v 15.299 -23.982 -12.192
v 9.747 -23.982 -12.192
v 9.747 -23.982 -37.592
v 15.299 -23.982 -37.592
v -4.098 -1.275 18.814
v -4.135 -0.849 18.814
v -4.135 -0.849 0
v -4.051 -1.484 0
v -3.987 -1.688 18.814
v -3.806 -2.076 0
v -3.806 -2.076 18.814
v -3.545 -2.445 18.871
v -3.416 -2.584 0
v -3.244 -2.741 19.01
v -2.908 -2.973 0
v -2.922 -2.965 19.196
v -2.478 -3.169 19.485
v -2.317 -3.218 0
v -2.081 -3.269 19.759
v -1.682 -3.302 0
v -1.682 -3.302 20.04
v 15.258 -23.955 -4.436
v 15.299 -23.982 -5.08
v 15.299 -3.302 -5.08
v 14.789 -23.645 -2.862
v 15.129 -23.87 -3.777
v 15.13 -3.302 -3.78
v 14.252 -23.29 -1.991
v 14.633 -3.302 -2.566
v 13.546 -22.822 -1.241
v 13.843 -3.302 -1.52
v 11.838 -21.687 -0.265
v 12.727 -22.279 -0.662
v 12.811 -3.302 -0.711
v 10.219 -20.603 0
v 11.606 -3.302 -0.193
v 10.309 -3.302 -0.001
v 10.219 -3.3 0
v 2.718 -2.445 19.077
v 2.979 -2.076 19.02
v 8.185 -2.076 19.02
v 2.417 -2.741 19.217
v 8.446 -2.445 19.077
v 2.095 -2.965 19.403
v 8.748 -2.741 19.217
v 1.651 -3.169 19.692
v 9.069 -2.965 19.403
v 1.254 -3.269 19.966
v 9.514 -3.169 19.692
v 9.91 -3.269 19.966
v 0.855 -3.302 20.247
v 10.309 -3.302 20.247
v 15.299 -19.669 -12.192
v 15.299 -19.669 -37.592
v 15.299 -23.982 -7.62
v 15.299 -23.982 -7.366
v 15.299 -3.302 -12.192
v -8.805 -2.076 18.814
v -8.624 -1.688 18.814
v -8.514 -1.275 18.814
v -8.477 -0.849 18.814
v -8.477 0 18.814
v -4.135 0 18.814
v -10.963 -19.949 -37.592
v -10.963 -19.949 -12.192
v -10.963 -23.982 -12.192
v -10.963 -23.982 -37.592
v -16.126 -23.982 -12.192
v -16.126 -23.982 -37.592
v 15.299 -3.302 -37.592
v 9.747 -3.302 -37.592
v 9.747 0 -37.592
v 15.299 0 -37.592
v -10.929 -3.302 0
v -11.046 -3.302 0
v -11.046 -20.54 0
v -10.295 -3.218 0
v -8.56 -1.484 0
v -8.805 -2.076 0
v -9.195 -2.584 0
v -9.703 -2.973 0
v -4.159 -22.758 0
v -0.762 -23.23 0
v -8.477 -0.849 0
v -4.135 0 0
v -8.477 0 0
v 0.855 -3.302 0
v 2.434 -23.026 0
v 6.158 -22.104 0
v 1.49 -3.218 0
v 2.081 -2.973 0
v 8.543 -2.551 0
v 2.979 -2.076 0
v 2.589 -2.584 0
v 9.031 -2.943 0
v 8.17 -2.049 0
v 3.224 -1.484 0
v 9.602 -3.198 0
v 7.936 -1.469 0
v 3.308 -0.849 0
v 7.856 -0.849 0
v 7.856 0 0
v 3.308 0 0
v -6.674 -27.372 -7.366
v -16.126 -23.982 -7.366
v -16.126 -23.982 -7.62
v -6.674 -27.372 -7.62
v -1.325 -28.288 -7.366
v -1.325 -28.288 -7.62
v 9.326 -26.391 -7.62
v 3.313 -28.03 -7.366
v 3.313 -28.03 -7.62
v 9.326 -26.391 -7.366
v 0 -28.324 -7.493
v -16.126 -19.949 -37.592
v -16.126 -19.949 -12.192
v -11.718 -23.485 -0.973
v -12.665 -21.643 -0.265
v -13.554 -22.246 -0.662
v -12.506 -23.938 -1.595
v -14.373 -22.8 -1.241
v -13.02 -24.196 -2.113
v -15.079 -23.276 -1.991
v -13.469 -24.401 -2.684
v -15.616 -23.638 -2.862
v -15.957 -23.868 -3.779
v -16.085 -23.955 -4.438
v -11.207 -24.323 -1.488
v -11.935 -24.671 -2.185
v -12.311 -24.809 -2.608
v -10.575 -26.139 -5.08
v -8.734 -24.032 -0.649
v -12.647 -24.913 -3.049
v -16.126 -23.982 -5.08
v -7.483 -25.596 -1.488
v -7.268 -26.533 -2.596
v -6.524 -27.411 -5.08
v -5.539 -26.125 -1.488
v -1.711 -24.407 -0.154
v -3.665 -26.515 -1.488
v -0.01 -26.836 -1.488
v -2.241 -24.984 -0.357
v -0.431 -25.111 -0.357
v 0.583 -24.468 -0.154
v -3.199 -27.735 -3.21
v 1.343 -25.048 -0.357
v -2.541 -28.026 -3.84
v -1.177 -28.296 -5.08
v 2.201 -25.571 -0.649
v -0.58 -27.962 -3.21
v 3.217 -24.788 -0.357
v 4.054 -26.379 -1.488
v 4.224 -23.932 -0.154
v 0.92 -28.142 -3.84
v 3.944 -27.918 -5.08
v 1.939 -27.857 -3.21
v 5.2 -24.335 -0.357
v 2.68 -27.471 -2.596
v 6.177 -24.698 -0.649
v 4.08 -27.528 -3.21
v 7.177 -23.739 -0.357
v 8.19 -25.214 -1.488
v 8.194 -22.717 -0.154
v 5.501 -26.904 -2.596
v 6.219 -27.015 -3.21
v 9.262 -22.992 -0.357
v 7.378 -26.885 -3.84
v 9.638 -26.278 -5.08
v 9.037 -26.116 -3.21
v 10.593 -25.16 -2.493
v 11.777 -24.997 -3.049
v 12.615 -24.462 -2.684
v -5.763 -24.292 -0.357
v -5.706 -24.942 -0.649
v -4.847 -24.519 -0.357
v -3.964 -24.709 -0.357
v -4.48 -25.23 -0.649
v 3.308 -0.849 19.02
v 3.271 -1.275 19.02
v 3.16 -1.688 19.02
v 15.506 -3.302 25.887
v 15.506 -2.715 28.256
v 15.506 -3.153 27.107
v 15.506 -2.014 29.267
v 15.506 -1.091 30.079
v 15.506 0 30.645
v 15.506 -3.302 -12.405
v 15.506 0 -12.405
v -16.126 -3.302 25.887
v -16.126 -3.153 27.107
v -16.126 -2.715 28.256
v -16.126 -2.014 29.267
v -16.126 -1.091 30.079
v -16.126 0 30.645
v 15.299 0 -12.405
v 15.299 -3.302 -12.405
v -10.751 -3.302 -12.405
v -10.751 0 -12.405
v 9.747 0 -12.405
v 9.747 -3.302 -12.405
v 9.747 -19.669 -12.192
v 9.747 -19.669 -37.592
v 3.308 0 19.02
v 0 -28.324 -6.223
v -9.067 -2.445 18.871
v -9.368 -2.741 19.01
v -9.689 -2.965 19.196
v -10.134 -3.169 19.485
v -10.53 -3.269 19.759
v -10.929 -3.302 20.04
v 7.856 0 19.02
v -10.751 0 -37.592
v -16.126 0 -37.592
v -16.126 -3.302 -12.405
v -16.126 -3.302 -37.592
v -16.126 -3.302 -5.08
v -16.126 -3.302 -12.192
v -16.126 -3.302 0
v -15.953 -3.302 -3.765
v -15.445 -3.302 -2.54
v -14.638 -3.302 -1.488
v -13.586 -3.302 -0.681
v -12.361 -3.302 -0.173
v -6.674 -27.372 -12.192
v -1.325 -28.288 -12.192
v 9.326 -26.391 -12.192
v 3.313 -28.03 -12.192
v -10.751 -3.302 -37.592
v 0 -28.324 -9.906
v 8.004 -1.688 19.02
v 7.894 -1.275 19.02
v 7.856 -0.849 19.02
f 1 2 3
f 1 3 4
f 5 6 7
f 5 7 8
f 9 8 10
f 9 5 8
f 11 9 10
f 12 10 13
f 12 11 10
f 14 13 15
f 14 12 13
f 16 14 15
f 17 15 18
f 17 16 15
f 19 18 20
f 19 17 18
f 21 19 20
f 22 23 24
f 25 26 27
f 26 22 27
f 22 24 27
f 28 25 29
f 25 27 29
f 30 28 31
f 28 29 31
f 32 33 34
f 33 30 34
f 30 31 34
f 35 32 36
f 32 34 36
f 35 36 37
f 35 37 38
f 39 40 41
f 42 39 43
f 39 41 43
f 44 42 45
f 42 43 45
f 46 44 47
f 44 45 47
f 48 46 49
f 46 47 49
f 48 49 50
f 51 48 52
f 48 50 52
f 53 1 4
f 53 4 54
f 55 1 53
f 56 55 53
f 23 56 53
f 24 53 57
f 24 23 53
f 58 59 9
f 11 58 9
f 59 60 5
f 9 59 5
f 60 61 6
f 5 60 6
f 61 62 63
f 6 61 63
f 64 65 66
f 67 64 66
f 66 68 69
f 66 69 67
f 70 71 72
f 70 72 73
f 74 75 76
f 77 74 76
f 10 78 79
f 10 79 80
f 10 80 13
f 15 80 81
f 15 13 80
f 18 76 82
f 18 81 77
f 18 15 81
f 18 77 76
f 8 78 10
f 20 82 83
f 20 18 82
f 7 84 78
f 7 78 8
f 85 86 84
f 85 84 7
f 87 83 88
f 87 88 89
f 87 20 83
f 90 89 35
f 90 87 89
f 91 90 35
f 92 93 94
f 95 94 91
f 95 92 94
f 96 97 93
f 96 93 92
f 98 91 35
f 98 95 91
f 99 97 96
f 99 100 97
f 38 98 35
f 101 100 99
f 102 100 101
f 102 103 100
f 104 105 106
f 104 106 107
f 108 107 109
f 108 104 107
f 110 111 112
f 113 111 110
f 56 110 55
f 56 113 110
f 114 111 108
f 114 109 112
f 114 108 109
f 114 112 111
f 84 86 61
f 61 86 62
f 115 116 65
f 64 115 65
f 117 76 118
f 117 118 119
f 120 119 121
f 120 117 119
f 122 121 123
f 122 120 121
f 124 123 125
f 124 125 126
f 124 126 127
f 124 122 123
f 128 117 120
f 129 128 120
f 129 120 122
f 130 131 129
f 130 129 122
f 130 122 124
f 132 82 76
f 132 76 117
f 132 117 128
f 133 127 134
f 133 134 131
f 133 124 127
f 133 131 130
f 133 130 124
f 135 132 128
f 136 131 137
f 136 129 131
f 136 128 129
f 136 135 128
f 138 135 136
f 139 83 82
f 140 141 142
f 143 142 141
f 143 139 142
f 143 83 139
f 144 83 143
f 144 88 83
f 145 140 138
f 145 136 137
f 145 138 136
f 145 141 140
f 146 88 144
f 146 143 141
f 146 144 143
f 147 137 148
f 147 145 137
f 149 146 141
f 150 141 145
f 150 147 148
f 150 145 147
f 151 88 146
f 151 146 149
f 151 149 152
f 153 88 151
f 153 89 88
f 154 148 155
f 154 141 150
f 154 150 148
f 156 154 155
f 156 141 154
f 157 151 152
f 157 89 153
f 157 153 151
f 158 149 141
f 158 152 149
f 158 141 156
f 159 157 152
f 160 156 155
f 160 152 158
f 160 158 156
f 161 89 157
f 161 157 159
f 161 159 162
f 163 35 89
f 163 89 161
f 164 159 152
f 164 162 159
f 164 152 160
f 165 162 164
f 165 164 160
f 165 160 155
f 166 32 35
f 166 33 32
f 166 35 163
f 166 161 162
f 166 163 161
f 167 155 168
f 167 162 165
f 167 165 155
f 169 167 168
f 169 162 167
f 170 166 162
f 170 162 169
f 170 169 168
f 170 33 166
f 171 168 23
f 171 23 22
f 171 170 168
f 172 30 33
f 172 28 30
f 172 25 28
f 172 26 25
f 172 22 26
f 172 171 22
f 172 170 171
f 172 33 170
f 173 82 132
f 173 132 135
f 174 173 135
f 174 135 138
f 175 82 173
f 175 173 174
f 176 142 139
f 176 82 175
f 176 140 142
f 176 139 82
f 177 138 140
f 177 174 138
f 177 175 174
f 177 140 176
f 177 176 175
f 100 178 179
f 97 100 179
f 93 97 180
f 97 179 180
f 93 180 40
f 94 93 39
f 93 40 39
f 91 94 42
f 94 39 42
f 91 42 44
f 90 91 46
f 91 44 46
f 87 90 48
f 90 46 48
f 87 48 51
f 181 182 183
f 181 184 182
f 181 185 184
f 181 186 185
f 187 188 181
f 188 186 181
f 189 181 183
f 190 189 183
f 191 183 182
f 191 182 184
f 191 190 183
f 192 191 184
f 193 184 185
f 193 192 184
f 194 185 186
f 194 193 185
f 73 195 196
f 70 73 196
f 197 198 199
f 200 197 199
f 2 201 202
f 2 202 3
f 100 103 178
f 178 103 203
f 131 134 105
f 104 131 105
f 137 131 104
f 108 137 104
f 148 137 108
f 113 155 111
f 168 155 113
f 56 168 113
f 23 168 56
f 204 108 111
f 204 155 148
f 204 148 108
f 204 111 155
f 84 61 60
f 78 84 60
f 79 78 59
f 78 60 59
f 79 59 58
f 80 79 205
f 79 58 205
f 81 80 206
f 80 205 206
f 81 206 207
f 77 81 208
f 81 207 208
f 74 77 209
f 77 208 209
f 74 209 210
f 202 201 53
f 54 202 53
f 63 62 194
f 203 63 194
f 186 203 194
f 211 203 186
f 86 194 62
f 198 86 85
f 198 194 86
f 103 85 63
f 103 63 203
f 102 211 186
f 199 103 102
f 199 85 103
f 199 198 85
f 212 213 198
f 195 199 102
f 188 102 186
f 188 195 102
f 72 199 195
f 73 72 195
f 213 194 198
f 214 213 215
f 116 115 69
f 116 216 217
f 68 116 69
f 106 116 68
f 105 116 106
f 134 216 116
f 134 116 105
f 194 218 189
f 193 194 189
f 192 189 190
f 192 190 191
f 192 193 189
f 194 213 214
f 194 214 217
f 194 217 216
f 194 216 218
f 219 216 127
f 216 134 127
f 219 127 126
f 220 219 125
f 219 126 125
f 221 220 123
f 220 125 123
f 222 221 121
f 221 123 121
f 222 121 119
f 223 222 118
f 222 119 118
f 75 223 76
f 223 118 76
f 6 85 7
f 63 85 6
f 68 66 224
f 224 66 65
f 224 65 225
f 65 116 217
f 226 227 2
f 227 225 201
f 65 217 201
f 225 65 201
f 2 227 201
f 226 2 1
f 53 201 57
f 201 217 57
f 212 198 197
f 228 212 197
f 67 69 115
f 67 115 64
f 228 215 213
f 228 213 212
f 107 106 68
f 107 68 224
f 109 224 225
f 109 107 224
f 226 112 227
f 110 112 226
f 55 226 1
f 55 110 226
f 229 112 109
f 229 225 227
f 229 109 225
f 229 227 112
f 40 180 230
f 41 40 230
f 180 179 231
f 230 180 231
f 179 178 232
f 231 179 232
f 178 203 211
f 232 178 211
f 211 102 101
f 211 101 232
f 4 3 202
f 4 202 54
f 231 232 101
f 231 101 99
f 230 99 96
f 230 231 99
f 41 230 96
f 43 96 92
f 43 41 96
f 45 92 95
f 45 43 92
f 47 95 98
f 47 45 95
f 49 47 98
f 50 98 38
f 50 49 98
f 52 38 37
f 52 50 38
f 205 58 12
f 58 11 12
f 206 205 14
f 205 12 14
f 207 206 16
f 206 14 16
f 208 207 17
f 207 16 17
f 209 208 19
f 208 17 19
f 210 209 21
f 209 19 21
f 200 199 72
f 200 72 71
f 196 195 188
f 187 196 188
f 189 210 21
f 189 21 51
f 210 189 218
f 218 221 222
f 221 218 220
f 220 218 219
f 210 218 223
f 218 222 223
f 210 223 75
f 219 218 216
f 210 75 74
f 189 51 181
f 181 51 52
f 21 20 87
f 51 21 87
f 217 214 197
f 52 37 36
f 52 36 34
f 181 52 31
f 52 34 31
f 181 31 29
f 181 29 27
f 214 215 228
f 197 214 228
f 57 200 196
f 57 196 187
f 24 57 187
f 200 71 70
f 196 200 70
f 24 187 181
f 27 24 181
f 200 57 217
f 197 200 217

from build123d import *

# Parameters (mm, degrees)
F0_W        = 31.6318599507
F0_H        = 42.7960464731
F0_W_2      = 4.3416279368
F0_H_2      = 18.813719973
F0_W_3      = 4.5483717695
F0_H_3      = 19.0204642713
F1_DEPTH    = 3.302
F3_DEPTH    = 0.254
F4_DEPTH    = 12.192
F5_DEPTH    = 7.62
F6_DEPTH    = 7.366
F7_R        = 5.08
F8_T1_DEPTH = 55.4253023246
F9_W        = 5.16293291
F9_H        = 4.0333122015
F9_W_2      = 5.5523253977
F9_H_2      = 4.3130330741
F9_H_3      = 3.302
F9_W_3      = 5.3753489628
F10_DEPTH   = 25.4
F11_R       = 2.4528409794
F12_R       = 1.2264204897


# Not quite as in the source:
# - a fillet or chamfer that OpenCascade refuses, or shapes differently, is made with other operations: its cross-section is extruded or revolved along the edge and cut away or added


with BuildPart() as f1:
    # F0 (on Front) → F1 (new body)
    with BuildSketch(Plane.XZ):
        with Locations((-0.3101159818, 8.9933718555)):
            Rectangle(F0_W, F0_H)
        with Locations((-6.3056976069, 9.4068599865)):
            Rectangle(F0_W_2, F0_H_2, mode=Mode.SUBTRACT)
        with Locations((5.5820937268, 9.5102321357)):
            Rectangle(F0_W_3, F0_H_3, mode=Mode.SUBTRACT)
    extrude(amount=F1_DEPTH)

    # F3 (add): a face of the model
    f3_faces = [f1.faces().sort_by_distance(p)[0] for p in [
        (-0.3101159818, -1.651, 30.391395092),
    ]]
    extrude(f3_faces, amount=F3_DEPTH)

    # F2 (on Top) → F4 (join)
    with BuildSketch(Plane.XY):
        with BuildLine():
            Line((-16.1260459572, -3.0640123878), (-16.1260459572, -5.3753489628))
            Line((-16.1260459572, -5.3753489628), (-16.1260459572, -23.9823255688))
            add(Edge.make_bspline(
                [(-16.1260459572, -23.9823255688), (-10.712885637, -26.1710511495), (-0.0173269949, -30.4956307693), (10.2353861269, -26.1356592233), (15.2990687639, -23.9823255688)],
                knots=[0, 0, 0, 0, 0.5061129111, 1, 1, 1, 1], degree=3))
            Line((15.2990687639, -23.9823255688), (15.2990687639, -5.1686046645))
            Line((15.2990687639, -5.1686046645), (15.2990687639, -3.0640123878))
            Line((15.2990687639, -3.0640123878), (-16.1260459572, -3.0640123878))
        make_face()
    extrude(amount=-F4_DEPTH)

    # F5 (add): a face of the model
    f5_faces = [f1.faces().sort_by_distance(p)[0] for p in [
        (-0.3946759913, -14.5235842944, 0),
    ]]
    extrude(f5_faces, amount=-F5_DEPTH)

    # F6 (add): a face of the model
    f6_faces = [f1.faces().sort_by_distance(p)[0] for p in [
        (-0.3946759913, -14.5235842944, 0),
    ]]
    extrude(f6_faces, amount=-F6_DEPTH)

    # F7
    f7_edges = [f1.edges().sort_by_distance(p)[0] for p in [
        (-0.398964, -28.322485, 0),
        (15.299069, -13.642163, 0),
        (-16.126046, -13.642163, 0),
    ]]
    fillet(f7_edges, radius=F7_R)

    # F8: fillet of radius 5.08 on 1 edges, made by hand

    # F8_s2 → F8_t1 (cut)
    with BuildSketch(Plane.YZ.offset(-28.0227671442)):
        with BuildLine():
            ThreePointArc((-3.302, 25.8867066172), (-2.3956458882, 28.782752197), (0, 30.645395092))
            Line((0, 30.645395092), (-3.302, 30.645395092))
            Line((-3.302, 30.645395092), (-3.302, 25.8867066172))
        make_face()
    extrude(amount=F8_T1_DEPTH, mode=Mode.SUBTRACT)

    # F9 (on face) → F10 (join)
    with BuildSketch(Plane(origin=(0, 0, -12.192), x_dir=(1, 0, 0), z_dir=(0, 0, -1))):
        with Locations((-13.5445795022, 21.965669468)):
            Rectangle(F9_W, F9_H)
        with Locations((12.522906065, 21.8258090317)):
            Rectangle(F9_W_2, F9_H_2)
        with Locations((12.522906065, 1.651)):
            Rectangle(F9_W_2, F9_H_3)
        with Locations((-13.4383714758, 1.651)):
            Rectangle(F9_W_3, F9_H_3)
    extrude(amount=F10_DEPTH)

    # F11
    f11_edges = [f1.edges().sort_by_distance(p)[0] for p in [
        (-8.476512, -3.302, 9.40686),
        (7.85628, -3.302, 9.510232),
        (3.307908, -3.302, 9.510232),
        (-4.134884, -3.302, 9.40686),
    ]]
    fillet(f11_edges, radius=F11_R)

    # F12
    f12_edges = [f1.edges().sort_by_distance(p)[0] for p in [
        (5.582094, -3.302, 19.020464),
        (-6.305698, -3.302, 18.81372),
    ]]
    fillet(f12_edges, radius=F12_R)


solid = f1.part
